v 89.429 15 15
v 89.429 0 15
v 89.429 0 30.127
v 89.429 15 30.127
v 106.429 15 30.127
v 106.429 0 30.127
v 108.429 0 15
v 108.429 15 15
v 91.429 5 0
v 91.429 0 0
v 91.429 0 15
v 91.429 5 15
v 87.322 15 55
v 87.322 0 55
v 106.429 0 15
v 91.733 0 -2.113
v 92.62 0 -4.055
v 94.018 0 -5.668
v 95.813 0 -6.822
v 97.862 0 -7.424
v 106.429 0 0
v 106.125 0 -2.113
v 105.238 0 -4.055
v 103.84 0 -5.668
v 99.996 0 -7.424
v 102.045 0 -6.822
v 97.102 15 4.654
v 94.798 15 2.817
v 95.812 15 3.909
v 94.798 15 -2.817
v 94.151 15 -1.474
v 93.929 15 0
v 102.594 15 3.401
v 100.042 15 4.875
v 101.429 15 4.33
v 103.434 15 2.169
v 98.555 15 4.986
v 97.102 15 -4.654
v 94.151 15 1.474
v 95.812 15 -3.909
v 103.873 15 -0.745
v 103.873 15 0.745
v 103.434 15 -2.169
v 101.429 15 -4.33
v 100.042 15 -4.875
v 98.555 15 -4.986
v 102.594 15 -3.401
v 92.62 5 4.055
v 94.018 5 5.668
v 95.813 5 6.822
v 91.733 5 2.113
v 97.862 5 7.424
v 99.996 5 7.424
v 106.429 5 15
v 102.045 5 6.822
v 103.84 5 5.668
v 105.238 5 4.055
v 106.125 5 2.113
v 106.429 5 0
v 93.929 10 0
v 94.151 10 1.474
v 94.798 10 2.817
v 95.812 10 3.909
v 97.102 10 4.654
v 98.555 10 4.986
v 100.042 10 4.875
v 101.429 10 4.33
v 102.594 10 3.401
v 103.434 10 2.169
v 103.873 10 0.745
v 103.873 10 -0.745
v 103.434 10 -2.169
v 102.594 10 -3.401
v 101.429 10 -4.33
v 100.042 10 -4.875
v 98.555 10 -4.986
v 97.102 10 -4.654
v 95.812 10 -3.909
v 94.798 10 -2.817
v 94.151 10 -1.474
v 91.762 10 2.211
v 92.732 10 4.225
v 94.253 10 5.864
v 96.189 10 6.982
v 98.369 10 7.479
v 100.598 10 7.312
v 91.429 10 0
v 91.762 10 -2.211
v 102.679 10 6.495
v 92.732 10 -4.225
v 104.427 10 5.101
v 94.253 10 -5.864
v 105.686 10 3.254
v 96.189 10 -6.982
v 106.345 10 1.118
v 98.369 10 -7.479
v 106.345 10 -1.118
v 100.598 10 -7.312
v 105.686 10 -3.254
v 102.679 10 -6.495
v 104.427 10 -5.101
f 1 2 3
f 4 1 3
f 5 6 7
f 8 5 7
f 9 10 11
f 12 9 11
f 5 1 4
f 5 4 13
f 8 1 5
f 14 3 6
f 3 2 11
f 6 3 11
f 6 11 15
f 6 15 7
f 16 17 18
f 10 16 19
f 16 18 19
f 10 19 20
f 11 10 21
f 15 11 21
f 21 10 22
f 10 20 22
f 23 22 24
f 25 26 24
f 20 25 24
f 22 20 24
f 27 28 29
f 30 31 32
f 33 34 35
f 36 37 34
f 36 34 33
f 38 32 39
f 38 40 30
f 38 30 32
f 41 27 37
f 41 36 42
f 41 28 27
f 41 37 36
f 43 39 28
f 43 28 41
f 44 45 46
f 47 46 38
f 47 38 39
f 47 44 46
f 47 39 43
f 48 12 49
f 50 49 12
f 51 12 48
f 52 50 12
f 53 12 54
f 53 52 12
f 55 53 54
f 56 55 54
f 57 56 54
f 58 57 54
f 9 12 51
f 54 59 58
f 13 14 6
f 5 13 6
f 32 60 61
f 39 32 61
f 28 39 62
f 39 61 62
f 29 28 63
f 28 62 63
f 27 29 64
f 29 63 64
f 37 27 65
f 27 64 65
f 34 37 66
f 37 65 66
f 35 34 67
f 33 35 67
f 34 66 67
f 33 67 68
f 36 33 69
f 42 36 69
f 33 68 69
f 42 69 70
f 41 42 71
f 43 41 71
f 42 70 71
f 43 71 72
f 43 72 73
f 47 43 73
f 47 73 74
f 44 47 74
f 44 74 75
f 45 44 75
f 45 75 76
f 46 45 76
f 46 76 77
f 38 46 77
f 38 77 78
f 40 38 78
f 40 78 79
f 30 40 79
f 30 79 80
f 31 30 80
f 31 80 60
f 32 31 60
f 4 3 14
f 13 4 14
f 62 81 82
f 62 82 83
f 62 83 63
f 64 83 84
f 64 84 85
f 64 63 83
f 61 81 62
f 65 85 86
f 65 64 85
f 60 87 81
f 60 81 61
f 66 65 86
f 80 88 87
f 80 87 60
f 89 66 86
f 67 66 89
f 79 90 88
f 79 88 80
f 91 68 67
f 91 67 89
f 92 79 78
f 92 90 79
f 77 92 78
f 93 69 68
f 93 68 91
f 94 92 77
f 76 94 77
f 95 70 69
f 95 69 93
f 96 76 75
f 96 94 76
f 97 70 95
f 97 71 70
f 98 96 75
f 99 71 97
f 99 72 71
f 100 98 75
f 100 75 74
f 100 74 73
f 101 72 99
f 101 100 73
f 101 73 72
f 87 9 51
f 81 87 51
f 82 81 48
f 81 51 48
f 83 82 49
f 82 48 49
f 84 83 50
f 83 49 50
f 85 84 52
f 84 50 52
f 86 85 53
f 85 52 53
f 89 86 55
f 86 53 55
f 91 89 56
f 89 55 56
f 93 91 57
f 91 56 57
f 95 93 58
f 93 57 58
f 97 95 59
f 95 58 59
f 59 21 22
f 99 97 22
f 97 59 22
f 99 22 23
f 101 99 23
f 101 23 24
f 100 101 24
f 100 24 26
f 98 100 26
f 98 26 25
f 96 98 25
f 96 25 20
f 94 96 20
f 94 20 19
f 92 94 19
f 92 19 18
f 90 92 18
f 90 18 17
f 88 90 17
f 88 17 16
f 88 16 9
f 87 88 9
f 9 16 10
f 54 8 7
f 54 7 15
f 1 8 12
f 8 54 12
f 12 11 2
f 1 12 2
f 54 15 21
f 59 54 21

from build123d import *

# Parameters (mm, degrees)
SKETCH1_6_R         = 5
BOSS_EXTRUDE5_DEPTH = 15
SKETCH1_7_R         = 7.5
SKETCH1_7_R_2       = 5
BOSS_EXTRUDE6_DEPTH = 10
BOSS_EXTRUDE7_DEPTH = 5
BOSS_EXTRUDE8_DEPTH = 15


with BuildPart() as part:
    # Sketch1<6> → Boss-Extrude5 (new body)
    with BuildSketch(Plane(origin=(0, 0, 0), x_dir=(1, 0, 0), z_dir=(0, 1, 0))):
        with Locations((98.929018633, 0)):
            Circle(SKETCH1_6_R)
    extrude(amount=BOSS_EXTRUDE5_DEPTH)

    # Sketch1<7> → Boss-Extrude6 (add)
    with BuildSketch(Plane(origin=(0, 0, 0), x_dir=(1, 0, 0), z_dir=(0, 1, 0))):
        with Locations((98.929018633, 0)):
            Circle(SKETCH1_7_R)
        with Locations((98.929018633, 0)):
            Circle(SKETCH1_7_R_2, mode=Mode.SUBTRACT)
    extrude(amount=BOSS_EXTRUDE6_DEPTH)

    # Sketch1<8> → Boss-Extrude7 (add)
    with BuildSketch(Plane(origin=(0, 0, 0), x_dir=(1, 0, 0), z_dir=(0, 1, 0))):
        with BuildLine():
            ThreePointArc((106.429018633, 0), (98.929018633, -7.5), (91.429018633, 0))
            Line((91.429018633, 0), (91.429018633, -15))
            Line((91.429018633, -15), (106.429018633, -15))
            Line((106.429018633, -15), (106.429018633, 0))
        make_face()
    extrude(amount=BOSS_EXTRUDE7_DEPTH)

    # Sketch1<9> → Boss-Extrude8 (add)
    with BuildSketch(Plane(origin=(0, 0, 0), x_dir=(1, 0, 0), z_dir=(0, 1, 0))):
        Polygon((106.429018633, -15), (91.429018633, -15), (89.429018633, -15), (89.429018633, -30.12715853), (87.321654073, -55), (106.429018633, -30.12715853), (108.429018633, -15), align=None)
    extrude(amount=BOSS_EXTRUDE8_DEPTH)


solid = part.part
